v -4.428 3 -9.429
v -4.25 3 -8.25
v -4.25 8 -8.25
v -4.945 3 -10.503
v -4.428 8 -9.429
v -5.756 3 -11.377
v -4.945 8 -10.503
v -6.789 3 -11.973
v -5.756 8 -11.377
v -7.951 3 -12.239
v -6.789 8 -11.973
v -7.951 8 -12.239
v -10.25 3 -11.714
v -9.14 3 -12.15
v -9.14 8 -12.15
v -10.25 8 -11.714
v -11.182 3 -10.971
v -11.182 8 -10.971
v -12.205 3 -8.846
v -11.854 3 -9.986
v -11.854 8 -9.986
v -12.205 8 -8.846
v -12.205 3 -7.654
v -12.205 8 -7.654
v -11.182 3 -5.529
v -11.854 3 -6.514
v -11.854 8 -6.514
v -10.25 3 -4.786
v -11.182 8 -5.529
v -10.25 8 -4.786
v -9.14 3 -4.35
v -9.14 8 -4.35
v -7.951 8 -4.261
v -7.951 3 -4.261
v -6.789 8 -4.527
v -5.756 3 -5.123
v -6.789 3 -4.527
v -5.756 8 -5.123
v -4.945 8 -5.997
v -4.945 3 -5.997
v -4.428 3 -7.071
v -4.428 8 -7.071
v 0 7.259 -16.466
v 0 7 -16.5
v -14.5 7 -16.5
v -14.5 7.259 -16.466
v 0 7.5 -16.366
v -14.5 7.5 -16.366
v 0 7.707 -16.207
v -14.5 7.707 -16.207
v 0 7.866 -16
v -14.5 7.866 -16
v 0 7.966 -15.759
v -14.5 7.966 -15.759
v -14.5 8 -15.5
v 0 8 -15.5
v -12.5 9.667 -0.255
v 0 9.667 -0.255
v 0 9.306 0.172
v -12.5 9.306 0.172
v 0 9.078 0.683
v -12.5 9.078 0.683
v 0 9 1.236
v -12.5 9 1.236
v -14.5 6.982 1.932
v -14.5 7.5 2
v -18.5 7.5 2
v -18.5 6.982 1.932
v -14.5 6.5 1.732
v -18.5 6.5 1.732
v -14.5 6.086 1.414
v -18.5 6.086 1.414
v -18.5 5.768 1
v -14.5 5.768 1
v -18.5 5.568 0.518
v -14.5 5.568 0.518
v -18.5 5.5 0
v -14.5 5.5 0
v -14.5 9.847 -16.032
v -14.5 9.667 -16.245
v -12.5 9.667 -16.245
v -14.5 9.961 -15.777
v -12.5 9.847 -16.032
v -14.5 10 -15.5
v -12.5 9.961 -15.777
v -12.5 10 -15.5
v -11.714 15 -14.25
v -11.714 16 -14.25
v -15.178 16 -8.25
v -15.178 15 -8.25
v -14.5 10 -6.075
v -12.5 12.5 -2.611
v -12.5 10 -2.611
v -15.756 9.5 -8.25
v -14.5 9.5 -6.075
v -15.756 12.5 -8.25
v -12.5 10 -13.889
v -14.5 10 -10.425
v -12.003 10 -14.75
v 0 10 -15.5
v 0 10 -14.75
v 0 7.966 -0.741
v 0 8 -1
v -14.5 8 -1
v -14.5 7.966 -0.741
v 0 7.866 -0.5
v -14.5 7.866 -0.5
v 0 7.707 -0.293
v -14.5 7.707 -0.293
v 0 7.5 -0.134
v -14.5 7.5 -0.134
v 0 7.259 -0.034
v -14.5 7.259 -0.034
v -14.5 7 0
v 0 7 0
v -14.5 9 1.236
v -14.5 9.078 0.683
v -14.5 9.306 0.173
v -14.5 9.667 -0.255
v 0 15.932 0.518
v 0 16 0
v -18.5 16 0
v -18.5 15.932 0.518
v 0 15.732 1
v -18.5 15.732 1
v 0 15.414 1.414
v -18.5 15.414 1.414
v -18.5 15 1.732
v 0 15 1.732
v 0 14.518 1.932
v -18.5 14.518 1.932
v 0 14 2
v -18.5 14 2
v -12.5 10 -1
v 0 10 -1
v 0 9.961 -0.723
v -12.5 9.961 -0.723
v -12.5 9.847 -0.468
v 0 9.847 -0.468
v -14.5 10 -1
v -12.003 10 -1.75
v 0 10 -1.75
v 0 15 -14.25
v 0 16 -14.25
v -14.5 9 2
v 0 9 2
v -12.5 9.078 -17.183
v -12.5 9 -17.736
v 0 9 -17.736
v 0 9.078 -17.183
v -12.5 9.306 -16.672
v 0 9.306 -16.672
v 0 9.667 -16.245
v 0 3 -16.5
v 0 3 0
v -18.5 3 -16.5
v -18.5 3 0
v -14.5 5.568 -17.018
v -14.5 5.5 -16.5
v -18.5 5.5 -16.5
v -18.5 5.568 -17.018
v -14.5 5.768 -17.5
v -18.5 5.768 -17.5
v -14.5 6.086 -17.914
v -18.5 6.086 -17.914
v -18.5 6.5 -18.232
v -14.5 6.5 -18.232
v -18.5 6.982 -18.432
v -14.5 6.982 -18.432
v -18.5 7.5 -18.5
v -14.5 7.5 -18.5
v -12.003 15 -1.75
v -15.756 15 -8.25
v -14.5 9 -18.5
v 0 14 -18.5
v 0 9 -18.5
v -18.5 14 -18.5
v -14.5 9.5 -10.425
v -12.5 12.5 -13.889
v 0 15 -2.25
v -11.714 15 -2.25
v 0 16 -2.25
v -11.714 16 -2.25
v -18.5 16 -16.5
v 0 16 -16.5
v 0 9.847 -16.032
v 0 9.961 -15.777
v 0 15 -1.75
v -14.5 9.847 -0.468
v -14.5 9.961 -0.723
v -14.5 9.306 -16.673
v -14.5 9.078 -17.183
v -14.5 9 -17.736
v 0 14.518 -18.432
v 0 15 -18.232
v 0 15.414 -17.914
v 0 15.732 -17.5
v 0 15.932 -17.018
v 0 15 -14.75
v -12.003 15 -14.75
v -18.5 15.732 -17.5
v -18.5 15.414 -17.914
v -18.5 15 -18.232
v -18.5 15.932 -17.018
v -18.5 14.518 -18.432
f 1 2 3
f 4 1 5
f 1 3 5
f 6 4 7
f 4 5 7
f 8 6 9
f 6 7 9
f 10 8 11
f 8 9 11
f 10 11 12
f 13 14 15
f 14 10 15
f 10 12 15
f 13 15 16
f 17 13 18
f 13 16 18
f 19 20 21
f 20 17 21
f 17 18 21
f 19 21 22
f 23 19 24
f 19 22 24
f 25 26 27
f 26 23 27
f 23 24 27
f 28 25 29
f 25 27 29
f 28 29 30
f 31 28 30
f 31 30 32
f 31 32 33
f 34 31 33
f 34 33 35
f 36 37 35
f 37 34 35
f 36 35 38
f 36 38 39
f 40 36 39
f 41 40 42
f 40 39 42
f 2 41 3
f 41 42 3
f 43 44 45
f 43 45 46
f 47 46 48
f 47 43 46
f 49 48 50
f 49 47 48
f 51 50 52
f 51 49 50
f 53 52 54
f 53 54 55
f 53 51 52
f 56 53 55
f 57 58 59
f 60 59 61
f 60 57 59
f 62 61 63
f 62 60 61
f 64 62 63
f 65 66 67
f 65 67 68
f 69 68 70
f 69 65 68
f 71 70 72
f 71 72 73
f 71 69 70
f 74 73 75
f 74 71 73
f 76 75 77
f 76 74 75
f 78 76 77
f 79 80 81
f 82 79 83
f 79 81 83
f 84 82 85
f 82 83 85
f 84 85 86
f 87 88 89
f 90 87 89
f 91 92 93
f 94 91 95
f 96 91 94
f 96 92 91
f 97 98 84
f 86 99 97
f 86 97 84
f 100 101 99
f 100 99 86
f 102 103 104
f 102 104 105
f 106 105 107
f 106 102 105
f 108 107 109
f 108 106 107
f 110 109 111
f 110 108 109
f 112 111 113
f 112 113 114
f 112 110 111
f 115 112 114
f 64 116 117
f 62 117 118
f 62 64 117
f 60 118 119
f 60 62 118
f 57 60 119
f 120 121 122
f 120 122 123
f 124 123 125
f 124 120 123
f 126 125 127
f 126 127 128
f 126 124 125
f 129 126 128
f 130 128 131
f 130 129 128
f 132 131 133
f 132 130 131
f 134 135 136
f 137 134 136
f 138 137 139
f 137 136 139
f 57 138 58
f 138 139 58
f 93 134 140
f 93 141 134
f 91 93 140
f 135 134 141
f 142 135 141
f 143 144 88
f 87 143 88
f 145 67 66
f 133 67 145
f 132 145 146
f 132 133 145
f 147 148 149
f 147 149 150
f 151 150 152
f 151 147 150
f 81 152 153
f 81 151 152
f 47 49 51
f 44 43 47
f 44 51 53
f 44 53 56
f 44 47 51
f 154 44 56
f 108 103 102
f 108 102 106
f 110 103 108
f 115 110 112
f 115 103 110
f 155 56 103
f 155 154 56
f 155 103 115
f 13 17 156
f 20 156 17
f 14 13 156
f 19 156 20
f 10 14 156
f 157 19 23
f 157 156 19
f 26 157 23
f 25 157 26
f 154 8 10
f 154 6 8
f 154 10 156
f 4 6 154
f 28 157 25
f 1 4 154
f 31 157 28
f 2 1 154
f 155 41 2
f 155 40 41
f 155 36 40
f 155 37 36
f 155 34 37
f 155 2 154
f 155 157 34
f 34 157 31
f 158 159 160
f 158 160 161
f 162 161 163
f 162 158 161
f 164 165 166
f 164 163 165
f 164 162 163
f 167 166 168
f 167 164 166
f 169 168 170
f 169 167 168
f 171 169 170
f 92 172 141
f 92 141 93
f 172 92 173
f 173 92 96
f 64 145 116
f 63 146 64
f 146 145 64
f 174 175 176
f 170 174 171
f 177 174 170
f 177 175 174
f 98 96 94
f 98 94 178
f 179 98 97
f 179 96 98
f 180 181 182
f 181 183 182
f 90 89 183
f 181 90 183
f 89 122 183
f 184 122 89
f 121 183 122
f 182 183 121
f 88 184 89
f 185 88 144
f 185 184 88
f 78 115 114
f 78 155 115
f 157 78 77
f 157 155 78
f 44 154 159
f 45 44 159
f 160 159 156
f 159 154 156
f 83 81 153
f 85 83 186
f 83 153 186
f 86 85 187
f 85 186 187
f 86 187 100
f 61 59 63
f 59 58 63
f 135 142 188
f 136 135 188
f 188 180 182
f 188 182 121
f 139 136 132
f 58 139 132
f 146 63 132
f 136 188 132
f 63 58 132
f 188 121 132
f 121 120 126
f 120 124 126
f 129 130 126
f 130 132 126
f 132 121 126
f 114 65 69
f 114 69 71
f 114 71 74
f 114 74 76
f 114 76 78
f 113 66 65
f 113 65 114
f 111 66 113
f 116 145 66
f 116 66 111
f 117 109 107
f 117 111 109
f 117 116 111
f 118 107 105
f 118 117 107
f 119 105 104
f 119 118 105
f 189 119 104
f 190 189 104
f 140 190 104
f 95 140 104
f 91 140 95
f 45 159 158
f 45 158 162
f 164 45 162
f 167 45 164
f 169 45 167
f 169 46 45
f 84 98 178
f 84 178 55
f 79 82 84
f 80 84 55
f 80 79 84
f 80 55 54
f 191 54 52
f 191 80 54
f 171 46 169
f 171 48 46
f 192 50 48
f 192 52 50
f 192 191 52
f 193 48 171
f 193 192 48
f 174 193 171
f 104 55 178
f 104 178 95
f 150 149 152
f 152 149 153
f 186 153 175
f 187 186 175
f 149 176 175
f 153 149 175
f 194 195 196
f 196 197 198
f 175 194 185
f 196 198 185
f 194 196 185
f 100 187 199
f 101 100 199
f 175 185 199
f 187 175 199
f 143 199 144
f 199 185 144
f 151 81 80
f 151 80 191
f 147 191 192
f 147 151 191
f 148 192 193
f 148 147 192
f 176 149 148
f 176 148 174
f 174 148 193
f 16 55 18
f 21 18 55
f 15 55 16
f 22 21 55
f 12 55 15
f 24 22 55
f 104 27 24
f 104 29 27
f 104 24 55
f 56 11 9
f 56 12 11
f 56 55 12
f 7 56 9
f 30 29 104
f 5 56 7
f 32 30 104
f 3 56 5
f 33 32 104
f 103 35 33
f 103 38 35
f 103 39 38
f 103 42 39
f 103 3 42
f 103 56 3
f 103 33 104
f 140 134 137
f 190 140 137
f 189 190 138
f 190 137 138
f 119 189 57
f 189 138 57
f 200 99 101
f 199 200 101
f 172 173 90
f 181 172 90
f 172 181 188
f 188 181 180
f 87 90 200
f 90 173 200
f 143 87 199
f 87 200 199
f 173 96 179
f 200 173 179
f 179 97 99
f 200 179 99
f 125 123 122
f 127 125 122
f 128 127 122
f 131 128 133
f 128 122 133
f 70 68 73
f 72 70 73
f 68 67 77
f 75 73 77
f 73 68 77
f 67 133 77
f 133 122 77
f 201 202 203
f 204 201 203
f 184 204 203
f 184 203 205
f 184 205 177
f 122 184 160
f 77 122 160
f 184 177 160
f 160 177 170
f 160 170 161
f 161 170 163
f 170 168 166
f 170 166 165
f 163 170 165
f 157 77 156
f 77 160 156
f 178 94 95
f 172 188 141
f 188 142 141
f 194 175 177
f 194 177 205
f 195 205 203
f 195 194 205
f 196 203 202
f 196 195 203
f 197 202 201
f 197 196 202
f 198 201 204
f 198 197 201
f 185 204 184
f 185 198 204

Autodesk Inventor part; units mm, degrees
ref_plane "YZ Plane" through (0, 0, 0) normal (1, 0, 0) x (0, 1, 0)
ref_plane "XZ Plane" through (0, 0, 0) normal (0, 1, 0) x (-1, 0, 0)
ref_plane "XY Plane" through (0, 0, 0) normal (0, 0, 1) x (1, 0, 0)
sketch "Sketch1" plane through (0, 0, 0) normal (0, 1, 0) x (-1, 0, 0)
  line L0 (0, 0) -> (16.5, 0)
  line L1 (16.5, 0) -> (16.5, -16.5)
  line L2 (16.5, -16.5) -> (0, -16.5)
  line L3 (0, -16.5) -> (0, 0)
  dimension "d0" = 16.5
  dimension "d1" = 16.5
extrude "Extrusion1" add sketch "Sketch1" along normal blind 11
sketch "Sketch2" plane through (0, 0, 0) normal (1, 0, 0) x (0, 0, -1)
  line L0 (0, 0) -> (0, 5)
  line L1 (1, 6) -> (15.5, 6)
  line L2 (16.5, 0) -> (16.5, 11) projected
  line L3 (16.5, 0) -> (16.5, 5)
  arc A0 (1, 6) -> (0, 5) centre (1, 5) ccw
  arc A1 (16.5, 5) -> (15.5, 6) centre (15.5, 5) ccw
  line L4 (0, 5) -> (0, 6)
  line L5 (1, 7) -> (15.5, 7)
  line L6 (16.5, 5) -> (16.5, 6)
  arc A2 (1, 7) -> (0, 6) centre (1, 6) ccw
  arc A3 (16.5, 6) -> (15.5, 7) centre (15.5, 6) ccw
  line L7 (0, 11) -> (16.5, 11) projected
  line L8 (16.5, 11) -> (0, 11) projected
  point P0 (0, 6)
  point P1 (16.5, 6)
  point P2 (0, 7)
  point P3 (16.5, 7)
  dimension "d4" = 6
  dimension "d5" = 1
  dimension "d6" = 2
  dimension "d7" = 1
sketch "Sketch3" plane through (0, 11, 0) normal (0, 1, 0) x (1, 0, 0)
  line L0 (-15.7556, 8.25) -> (-12.0028, 14.75)
  line L1 (-12.0028, 14.75) -> (-4.4972, 14.75)
  line L2 (-4.4972, 14.75) -> (-0.7444, 8.25)
  line L3 (-0.7444, 8.25) -> (-4.4972, 1.75)
  line L4 (-4.4972, 1.75) -> (-12.0028, 1.75)
  line L5 (-12.0028, 1.75) -> (-15.7556, 8.25)
  point P0 (0, 0)
  point P1 (-8.25, 8.25)
  dimension "d8" = 13
extrude "Extrusion2" cut sketch "Sketch3" against normal blind 5
sketch "Sketch4" plane through (0, 6, 0) normal (0, 1, 0) x (1, 0, 0)
  line L0 (-4.4972, 1.75) -> (-12.0028, 1.75) projected
  line L1 (-12.0028, 14.75) -> (-4.4972, 14.75) projected
  circle A0 centre (-8.25, 8.25) radius 4
  point P0 (0, 0)
  dimension "d11" = 8
extrude "Extrusion3" cut sketch "Sketch4" against normal blind 20
extrude "Extrusion4" cut sketch "Sketch2" against normal blind 12.5
sketch "Sketch5" plane through (0, 11, 0) normal (0, 1, 0) x (1, 0, 0)
  line L0 (-4.4972, 1.75) -> (-12.0028, 1.75) projected
  line L1 (-12.0028, 1.75) -> (3.1486, 1.75)
  line L2 (3.1486, 1.75) -> (3.1486, 14.75)
  line L3 (3.1486, 14.75) -> (-12.0028, 14.75)
  line L4 (-12.0028, 14.75) -> (-12.0028, 1.75)
  point P0 (0, 0)
  dimension "d16" = 13
extrude "Extrusion5" cut sketch "Sketch5" against normal up to surface (4 mm away)
sketch "Sketch6" plane through (-16.5, 0, -16.5) normal (-1, 0, 0) x (0, 0, 1)
  line L0 (16.5, 0) -> (0, 0) projected
  line L1 (16.5, 0) -> (16.5, 11) projected
  line L2 (0, 11) -> (16.5, 11) projected
  line L3 (0, 0) -> (0, 11) projected
extrude "Extrusion6" add sketch "Sketch6" along normal blind 2
sketch "Sketch7" plane through (0, 0, 0) normal (0, -1, 0) x (1, 0, 0)
  circle A0 centre (-8.25, -8.25) radius 4 projected
  line L0 (0, 0) -> (-18.5, 0) projected
  line L1 (-18.5, -16.5) -> (-18.5, 0) projected
  line L2 (-18.5, -16.5) -> (0, -16.5) projected
  line L3 (0, -16.5) -> (0, 0) projected
extrude "Extrusion7" cut sketch "Sketch7" against normal blind 1
sketch "Sketch8" plane through (0, 11, 0) normal (0, 1, 0) x (1, 0, 0)
  line L0 (0, 1.75) -> (-12.0028, 1.75) projected
  line L1 (-12.0028, 1.75) -> (-15.7556, 8.25) projected
  line L2 (-15.7556, 8.25) -> (-12.0028, 14.75) projected
  line L3 (-12.0028, 14.75) -> (0, 14.75) projected
  line L4 (0, 14.75) -> (0, 16.5) projected
  line L5 (0, 16.5) -> (-18.5, 16.5) projected
  line L6 (-18.5, 0) -> (-18.5, 16.5) projected
  line L7 (0, 0) -> (-18.5, 0) projected
  line L8 (0, 0) -> (0, 1.75) projected
extrude "Extrusion8" add sketch "Sketch8" along normal blind 3
sketch "Sketch10" plane through (0, 7, -1) normal (1, 0, 0) x (0, 0, -1)
  line L0 (15.5, -1) -> (15.5, -2) projected
  line L1 (15.5, -1) -> (-1, -1)
  line L2 (-1, -1) -> (-1, 0)
  line L3 (0, 1) -> (14.5, 1)
  line L4 (15.5, 0) -> (15.5, -1)
  arc A0 (0, 1) -> (-1, 0) centre (0, 0) ccw
  arc A1 (15.5, 0) -> (14.5, 1) centre (14.5, 0) ccw
  point P0 (-1, -7)
  point P1 (-1, 1)
  point P2 (15.5, 1)
  dimension "d28" = 16.5
  dimension "d29" = 2
  dimension "d30" = 1
extrude "Extrusion9" cut sketch "Sketch10" against normal up to surface (12.5 mm away)
sketch "Sketch11" plane through (0, 5, -16.5) normal (0, 0, -1) x (-1, 0, 0)
  line L0 (18.5, 9) -> (0, 9) projected
  line L1 (0, 2) -> (0, 9) projected
  line L2 (18.5, 9) -> (0, 9)
  line L3 (0, 9) -> (0, 2)
  line L4 (0, 2) -> (18.5, 2)
  line L5 (18.5, 2) -> (18.5, 9)
  point P0 (0, -5)
extrude "Extrusion10" add sketch "Sketch11" along normal blind 2
ref_plane "Work Plane1" through (-15.7556, 14, -8.25) normal (0, 0, -1) x (-1, 0, 0)
mirror "Mirror1" about plane through (-15.7556, 14, -8.25) normal (0, 0, -1) of "Extrusion8", "Extrusion10", "Extrusion9", "Extrusion2"
sketch "Sketch12" plane through (-18.5, 0, -16.5) normal (-1, 0, 0) x (0, 0, 1)
  line L0 (18.5, 14) -> (18.5, 7) projected
  line L1 (18.5, 10.5) -> (-2, 10.5)
  line L2 (-2, 10.5) -> (-2, 3.5)
  line L3 (-2, 3.5) -> (18.5, 3.5)
  line L4 (18.5, 3.5) -> (18.5, 10.5)
  point P0 (16.5, 0)
  point P1 (18.5, 11)
  point P2 (18.5, 9)
extrude "Extrusion11" add sketch "Sketch12" against normal up to surface (6 mm away)
fillet "Fillet3" radius 2 2 edges at (-15.5, 3.5, -18.5) (-15.5, 3.5, 2)
fillet "Fillet4" radius 2 2 edges at (-9.25, 14, -18.5) (-9.25, 14, 2)
fillet "Fillet5" radius 2 2 edges at (-6.25, 7, -16.5) (-6.25, 7, 0)
sketch "Sketch13" plane through (-12.5, 10.5, -2.6112) normal (0, 1, 0) x (1, 0, 0)
  line L0 (-3.2556, 5.6388) -> (0, 11.2776) projected
  line L1 (0, 0) -> (-3.2556, 5.6388) projected
  line L2 (0, 0) -> (0, 11.2776) projected
  point P0 (12.5, -2.6112)
extrude "Extrusion12" cut sketch "Sketch13" against normal blind 3
sketch "Sketch14" plane through (-12.5, 0, 0) normal (1, 0, 0) x (0, 0, -1)
  line L0 (13.8888, 8) -> (13.8888, 7.5) projected
  line L1 (13.8888, 7.5) -> (2.6112, 7.5) projected
  line L2 (2.6112, 7.5) -> (2.6112, 8) projected
  line L3 (1, 8) -> (2.6112, 8) projected
  arc A0 (1, 8) -> (0.2546, 7.6667) centre (1, 7) ccw projected
  arc A1 (-1.2361, 7) -> (0.2546, 7.6667) centre (-1.2361, 9) ccw projected
  line L4 (-2, 7) -> (-1.2361, 7) projected
  line L5 (-2, 5.5) -> (-2, 7) projected
  arc A2 (-2, 5.5) -> (0, 3.5) centre (0, 5.5) ccw projected
  line L6 (0, 5) -> (0, 3.5) projected
  arc A3 (1, 6) -> (0, 5) centre (1, 5) ccw projected
  line L7 (15.5, 6) -> (1, 6) projected
  arc A4 (16.5, 5) -> (15.5, 6) centre (15.5, 5) ccw projected
  line L8 (16.5, 3.5) -> (16.5, 5) projected
  arc A5 (16.5, 3.5) -> (18.5, 5.5) centre (16.5, 5.5) ccw projected
  line L9 (18.5, 7) -> (18.5, 5.5) projected
  line L10 (17.7361, 7) -> (18.5, 7) projected
  arc A6 (16.2454, 7.6667) -> (17.7361, 7) centre (17.7361, 9) ccw projected
  arc A7 (16.2454, 7.6667) -> (15.5, 8) centre (15.5, 7) ccw projected
  line L11 (13.8888, 8) -> (15.5, 8) projected
  line L12 (13.8888, 8) -> (2.6112, 8)
  line L13 (2.6112, 8) -> (2.6112, 7.5)
  line L14 (2.6112, 7.5) -> (13.8888, 7.5)
  line L15 (13.8888, 7.5) -> (13.8888, 8)
  point P0 (0, 0)
extrude "Extrusion13" cut sketch "Sketch14" against normal blind 2
sketch "Sketch15" plane through (0, 14, 0) normal (0, 1, 0) x (1, 0, 0)
  line L0 (0, 0) -> (-18.5, 0) projected
  line L1 (0, 1.75) -> (0, 0) projected
  line L2 (0, 1.75) -> (-12.0028, 1.75) projected
  line L3 (-12.0028, 1.75) -> (-15.7556, 8.25) projected
  line L4 (-15.7556, 8.25) -> (-12.0028, 14.75) projected
  line L5 (-12.0028, 14.75) -> (0, 14.75) projected
  line L6 (0, 14.75) -> (0, 16.5) projected
  line L7 (-18.5, 16.5) -> (0, 16.5) projected
  line L8 (-18.5, 0) -> (-18.5, 16.5) projected
  line L9 (-11.7141, 14.25) -> (-15.1782, 8.25)
  line L10 (-15.1782, 8.25) -> (-11.7141, 2.25)
  line L11 (-11.7141, 2.25) -> (0, 2.25)
  line L12 (0, -0.5) -> (-19, -0.5)
  line L13 (-19, -0.5) -> (-19, 17)
  line L14 (-19, 17) -> (0, 17)
  line L15 (0, 14.25) -> (-11.7141, 14.25)
  line L16 (0, 14.75) -> (0, 14.25)
  line L17 (0, 2.25) -> (0, 1.75)
  line L18 (0.5, 2.25) -> (0.5, 1.75)
  line L19 (0.5, 14.75) -> (0.5, 14.25)
  point P0 (0, 0)
  dimension "d45" = 0.5
extrude "Extrusion14" add sketch "Sketch15" against normal blind 1 contours L2 L3 L4 L5 L16 L15 L9 L10 L11 L17
move or copy body "Move Body1" bodies to move or copy 1 copy no translate (0, 2, 0)
properties part number "nut holder"
